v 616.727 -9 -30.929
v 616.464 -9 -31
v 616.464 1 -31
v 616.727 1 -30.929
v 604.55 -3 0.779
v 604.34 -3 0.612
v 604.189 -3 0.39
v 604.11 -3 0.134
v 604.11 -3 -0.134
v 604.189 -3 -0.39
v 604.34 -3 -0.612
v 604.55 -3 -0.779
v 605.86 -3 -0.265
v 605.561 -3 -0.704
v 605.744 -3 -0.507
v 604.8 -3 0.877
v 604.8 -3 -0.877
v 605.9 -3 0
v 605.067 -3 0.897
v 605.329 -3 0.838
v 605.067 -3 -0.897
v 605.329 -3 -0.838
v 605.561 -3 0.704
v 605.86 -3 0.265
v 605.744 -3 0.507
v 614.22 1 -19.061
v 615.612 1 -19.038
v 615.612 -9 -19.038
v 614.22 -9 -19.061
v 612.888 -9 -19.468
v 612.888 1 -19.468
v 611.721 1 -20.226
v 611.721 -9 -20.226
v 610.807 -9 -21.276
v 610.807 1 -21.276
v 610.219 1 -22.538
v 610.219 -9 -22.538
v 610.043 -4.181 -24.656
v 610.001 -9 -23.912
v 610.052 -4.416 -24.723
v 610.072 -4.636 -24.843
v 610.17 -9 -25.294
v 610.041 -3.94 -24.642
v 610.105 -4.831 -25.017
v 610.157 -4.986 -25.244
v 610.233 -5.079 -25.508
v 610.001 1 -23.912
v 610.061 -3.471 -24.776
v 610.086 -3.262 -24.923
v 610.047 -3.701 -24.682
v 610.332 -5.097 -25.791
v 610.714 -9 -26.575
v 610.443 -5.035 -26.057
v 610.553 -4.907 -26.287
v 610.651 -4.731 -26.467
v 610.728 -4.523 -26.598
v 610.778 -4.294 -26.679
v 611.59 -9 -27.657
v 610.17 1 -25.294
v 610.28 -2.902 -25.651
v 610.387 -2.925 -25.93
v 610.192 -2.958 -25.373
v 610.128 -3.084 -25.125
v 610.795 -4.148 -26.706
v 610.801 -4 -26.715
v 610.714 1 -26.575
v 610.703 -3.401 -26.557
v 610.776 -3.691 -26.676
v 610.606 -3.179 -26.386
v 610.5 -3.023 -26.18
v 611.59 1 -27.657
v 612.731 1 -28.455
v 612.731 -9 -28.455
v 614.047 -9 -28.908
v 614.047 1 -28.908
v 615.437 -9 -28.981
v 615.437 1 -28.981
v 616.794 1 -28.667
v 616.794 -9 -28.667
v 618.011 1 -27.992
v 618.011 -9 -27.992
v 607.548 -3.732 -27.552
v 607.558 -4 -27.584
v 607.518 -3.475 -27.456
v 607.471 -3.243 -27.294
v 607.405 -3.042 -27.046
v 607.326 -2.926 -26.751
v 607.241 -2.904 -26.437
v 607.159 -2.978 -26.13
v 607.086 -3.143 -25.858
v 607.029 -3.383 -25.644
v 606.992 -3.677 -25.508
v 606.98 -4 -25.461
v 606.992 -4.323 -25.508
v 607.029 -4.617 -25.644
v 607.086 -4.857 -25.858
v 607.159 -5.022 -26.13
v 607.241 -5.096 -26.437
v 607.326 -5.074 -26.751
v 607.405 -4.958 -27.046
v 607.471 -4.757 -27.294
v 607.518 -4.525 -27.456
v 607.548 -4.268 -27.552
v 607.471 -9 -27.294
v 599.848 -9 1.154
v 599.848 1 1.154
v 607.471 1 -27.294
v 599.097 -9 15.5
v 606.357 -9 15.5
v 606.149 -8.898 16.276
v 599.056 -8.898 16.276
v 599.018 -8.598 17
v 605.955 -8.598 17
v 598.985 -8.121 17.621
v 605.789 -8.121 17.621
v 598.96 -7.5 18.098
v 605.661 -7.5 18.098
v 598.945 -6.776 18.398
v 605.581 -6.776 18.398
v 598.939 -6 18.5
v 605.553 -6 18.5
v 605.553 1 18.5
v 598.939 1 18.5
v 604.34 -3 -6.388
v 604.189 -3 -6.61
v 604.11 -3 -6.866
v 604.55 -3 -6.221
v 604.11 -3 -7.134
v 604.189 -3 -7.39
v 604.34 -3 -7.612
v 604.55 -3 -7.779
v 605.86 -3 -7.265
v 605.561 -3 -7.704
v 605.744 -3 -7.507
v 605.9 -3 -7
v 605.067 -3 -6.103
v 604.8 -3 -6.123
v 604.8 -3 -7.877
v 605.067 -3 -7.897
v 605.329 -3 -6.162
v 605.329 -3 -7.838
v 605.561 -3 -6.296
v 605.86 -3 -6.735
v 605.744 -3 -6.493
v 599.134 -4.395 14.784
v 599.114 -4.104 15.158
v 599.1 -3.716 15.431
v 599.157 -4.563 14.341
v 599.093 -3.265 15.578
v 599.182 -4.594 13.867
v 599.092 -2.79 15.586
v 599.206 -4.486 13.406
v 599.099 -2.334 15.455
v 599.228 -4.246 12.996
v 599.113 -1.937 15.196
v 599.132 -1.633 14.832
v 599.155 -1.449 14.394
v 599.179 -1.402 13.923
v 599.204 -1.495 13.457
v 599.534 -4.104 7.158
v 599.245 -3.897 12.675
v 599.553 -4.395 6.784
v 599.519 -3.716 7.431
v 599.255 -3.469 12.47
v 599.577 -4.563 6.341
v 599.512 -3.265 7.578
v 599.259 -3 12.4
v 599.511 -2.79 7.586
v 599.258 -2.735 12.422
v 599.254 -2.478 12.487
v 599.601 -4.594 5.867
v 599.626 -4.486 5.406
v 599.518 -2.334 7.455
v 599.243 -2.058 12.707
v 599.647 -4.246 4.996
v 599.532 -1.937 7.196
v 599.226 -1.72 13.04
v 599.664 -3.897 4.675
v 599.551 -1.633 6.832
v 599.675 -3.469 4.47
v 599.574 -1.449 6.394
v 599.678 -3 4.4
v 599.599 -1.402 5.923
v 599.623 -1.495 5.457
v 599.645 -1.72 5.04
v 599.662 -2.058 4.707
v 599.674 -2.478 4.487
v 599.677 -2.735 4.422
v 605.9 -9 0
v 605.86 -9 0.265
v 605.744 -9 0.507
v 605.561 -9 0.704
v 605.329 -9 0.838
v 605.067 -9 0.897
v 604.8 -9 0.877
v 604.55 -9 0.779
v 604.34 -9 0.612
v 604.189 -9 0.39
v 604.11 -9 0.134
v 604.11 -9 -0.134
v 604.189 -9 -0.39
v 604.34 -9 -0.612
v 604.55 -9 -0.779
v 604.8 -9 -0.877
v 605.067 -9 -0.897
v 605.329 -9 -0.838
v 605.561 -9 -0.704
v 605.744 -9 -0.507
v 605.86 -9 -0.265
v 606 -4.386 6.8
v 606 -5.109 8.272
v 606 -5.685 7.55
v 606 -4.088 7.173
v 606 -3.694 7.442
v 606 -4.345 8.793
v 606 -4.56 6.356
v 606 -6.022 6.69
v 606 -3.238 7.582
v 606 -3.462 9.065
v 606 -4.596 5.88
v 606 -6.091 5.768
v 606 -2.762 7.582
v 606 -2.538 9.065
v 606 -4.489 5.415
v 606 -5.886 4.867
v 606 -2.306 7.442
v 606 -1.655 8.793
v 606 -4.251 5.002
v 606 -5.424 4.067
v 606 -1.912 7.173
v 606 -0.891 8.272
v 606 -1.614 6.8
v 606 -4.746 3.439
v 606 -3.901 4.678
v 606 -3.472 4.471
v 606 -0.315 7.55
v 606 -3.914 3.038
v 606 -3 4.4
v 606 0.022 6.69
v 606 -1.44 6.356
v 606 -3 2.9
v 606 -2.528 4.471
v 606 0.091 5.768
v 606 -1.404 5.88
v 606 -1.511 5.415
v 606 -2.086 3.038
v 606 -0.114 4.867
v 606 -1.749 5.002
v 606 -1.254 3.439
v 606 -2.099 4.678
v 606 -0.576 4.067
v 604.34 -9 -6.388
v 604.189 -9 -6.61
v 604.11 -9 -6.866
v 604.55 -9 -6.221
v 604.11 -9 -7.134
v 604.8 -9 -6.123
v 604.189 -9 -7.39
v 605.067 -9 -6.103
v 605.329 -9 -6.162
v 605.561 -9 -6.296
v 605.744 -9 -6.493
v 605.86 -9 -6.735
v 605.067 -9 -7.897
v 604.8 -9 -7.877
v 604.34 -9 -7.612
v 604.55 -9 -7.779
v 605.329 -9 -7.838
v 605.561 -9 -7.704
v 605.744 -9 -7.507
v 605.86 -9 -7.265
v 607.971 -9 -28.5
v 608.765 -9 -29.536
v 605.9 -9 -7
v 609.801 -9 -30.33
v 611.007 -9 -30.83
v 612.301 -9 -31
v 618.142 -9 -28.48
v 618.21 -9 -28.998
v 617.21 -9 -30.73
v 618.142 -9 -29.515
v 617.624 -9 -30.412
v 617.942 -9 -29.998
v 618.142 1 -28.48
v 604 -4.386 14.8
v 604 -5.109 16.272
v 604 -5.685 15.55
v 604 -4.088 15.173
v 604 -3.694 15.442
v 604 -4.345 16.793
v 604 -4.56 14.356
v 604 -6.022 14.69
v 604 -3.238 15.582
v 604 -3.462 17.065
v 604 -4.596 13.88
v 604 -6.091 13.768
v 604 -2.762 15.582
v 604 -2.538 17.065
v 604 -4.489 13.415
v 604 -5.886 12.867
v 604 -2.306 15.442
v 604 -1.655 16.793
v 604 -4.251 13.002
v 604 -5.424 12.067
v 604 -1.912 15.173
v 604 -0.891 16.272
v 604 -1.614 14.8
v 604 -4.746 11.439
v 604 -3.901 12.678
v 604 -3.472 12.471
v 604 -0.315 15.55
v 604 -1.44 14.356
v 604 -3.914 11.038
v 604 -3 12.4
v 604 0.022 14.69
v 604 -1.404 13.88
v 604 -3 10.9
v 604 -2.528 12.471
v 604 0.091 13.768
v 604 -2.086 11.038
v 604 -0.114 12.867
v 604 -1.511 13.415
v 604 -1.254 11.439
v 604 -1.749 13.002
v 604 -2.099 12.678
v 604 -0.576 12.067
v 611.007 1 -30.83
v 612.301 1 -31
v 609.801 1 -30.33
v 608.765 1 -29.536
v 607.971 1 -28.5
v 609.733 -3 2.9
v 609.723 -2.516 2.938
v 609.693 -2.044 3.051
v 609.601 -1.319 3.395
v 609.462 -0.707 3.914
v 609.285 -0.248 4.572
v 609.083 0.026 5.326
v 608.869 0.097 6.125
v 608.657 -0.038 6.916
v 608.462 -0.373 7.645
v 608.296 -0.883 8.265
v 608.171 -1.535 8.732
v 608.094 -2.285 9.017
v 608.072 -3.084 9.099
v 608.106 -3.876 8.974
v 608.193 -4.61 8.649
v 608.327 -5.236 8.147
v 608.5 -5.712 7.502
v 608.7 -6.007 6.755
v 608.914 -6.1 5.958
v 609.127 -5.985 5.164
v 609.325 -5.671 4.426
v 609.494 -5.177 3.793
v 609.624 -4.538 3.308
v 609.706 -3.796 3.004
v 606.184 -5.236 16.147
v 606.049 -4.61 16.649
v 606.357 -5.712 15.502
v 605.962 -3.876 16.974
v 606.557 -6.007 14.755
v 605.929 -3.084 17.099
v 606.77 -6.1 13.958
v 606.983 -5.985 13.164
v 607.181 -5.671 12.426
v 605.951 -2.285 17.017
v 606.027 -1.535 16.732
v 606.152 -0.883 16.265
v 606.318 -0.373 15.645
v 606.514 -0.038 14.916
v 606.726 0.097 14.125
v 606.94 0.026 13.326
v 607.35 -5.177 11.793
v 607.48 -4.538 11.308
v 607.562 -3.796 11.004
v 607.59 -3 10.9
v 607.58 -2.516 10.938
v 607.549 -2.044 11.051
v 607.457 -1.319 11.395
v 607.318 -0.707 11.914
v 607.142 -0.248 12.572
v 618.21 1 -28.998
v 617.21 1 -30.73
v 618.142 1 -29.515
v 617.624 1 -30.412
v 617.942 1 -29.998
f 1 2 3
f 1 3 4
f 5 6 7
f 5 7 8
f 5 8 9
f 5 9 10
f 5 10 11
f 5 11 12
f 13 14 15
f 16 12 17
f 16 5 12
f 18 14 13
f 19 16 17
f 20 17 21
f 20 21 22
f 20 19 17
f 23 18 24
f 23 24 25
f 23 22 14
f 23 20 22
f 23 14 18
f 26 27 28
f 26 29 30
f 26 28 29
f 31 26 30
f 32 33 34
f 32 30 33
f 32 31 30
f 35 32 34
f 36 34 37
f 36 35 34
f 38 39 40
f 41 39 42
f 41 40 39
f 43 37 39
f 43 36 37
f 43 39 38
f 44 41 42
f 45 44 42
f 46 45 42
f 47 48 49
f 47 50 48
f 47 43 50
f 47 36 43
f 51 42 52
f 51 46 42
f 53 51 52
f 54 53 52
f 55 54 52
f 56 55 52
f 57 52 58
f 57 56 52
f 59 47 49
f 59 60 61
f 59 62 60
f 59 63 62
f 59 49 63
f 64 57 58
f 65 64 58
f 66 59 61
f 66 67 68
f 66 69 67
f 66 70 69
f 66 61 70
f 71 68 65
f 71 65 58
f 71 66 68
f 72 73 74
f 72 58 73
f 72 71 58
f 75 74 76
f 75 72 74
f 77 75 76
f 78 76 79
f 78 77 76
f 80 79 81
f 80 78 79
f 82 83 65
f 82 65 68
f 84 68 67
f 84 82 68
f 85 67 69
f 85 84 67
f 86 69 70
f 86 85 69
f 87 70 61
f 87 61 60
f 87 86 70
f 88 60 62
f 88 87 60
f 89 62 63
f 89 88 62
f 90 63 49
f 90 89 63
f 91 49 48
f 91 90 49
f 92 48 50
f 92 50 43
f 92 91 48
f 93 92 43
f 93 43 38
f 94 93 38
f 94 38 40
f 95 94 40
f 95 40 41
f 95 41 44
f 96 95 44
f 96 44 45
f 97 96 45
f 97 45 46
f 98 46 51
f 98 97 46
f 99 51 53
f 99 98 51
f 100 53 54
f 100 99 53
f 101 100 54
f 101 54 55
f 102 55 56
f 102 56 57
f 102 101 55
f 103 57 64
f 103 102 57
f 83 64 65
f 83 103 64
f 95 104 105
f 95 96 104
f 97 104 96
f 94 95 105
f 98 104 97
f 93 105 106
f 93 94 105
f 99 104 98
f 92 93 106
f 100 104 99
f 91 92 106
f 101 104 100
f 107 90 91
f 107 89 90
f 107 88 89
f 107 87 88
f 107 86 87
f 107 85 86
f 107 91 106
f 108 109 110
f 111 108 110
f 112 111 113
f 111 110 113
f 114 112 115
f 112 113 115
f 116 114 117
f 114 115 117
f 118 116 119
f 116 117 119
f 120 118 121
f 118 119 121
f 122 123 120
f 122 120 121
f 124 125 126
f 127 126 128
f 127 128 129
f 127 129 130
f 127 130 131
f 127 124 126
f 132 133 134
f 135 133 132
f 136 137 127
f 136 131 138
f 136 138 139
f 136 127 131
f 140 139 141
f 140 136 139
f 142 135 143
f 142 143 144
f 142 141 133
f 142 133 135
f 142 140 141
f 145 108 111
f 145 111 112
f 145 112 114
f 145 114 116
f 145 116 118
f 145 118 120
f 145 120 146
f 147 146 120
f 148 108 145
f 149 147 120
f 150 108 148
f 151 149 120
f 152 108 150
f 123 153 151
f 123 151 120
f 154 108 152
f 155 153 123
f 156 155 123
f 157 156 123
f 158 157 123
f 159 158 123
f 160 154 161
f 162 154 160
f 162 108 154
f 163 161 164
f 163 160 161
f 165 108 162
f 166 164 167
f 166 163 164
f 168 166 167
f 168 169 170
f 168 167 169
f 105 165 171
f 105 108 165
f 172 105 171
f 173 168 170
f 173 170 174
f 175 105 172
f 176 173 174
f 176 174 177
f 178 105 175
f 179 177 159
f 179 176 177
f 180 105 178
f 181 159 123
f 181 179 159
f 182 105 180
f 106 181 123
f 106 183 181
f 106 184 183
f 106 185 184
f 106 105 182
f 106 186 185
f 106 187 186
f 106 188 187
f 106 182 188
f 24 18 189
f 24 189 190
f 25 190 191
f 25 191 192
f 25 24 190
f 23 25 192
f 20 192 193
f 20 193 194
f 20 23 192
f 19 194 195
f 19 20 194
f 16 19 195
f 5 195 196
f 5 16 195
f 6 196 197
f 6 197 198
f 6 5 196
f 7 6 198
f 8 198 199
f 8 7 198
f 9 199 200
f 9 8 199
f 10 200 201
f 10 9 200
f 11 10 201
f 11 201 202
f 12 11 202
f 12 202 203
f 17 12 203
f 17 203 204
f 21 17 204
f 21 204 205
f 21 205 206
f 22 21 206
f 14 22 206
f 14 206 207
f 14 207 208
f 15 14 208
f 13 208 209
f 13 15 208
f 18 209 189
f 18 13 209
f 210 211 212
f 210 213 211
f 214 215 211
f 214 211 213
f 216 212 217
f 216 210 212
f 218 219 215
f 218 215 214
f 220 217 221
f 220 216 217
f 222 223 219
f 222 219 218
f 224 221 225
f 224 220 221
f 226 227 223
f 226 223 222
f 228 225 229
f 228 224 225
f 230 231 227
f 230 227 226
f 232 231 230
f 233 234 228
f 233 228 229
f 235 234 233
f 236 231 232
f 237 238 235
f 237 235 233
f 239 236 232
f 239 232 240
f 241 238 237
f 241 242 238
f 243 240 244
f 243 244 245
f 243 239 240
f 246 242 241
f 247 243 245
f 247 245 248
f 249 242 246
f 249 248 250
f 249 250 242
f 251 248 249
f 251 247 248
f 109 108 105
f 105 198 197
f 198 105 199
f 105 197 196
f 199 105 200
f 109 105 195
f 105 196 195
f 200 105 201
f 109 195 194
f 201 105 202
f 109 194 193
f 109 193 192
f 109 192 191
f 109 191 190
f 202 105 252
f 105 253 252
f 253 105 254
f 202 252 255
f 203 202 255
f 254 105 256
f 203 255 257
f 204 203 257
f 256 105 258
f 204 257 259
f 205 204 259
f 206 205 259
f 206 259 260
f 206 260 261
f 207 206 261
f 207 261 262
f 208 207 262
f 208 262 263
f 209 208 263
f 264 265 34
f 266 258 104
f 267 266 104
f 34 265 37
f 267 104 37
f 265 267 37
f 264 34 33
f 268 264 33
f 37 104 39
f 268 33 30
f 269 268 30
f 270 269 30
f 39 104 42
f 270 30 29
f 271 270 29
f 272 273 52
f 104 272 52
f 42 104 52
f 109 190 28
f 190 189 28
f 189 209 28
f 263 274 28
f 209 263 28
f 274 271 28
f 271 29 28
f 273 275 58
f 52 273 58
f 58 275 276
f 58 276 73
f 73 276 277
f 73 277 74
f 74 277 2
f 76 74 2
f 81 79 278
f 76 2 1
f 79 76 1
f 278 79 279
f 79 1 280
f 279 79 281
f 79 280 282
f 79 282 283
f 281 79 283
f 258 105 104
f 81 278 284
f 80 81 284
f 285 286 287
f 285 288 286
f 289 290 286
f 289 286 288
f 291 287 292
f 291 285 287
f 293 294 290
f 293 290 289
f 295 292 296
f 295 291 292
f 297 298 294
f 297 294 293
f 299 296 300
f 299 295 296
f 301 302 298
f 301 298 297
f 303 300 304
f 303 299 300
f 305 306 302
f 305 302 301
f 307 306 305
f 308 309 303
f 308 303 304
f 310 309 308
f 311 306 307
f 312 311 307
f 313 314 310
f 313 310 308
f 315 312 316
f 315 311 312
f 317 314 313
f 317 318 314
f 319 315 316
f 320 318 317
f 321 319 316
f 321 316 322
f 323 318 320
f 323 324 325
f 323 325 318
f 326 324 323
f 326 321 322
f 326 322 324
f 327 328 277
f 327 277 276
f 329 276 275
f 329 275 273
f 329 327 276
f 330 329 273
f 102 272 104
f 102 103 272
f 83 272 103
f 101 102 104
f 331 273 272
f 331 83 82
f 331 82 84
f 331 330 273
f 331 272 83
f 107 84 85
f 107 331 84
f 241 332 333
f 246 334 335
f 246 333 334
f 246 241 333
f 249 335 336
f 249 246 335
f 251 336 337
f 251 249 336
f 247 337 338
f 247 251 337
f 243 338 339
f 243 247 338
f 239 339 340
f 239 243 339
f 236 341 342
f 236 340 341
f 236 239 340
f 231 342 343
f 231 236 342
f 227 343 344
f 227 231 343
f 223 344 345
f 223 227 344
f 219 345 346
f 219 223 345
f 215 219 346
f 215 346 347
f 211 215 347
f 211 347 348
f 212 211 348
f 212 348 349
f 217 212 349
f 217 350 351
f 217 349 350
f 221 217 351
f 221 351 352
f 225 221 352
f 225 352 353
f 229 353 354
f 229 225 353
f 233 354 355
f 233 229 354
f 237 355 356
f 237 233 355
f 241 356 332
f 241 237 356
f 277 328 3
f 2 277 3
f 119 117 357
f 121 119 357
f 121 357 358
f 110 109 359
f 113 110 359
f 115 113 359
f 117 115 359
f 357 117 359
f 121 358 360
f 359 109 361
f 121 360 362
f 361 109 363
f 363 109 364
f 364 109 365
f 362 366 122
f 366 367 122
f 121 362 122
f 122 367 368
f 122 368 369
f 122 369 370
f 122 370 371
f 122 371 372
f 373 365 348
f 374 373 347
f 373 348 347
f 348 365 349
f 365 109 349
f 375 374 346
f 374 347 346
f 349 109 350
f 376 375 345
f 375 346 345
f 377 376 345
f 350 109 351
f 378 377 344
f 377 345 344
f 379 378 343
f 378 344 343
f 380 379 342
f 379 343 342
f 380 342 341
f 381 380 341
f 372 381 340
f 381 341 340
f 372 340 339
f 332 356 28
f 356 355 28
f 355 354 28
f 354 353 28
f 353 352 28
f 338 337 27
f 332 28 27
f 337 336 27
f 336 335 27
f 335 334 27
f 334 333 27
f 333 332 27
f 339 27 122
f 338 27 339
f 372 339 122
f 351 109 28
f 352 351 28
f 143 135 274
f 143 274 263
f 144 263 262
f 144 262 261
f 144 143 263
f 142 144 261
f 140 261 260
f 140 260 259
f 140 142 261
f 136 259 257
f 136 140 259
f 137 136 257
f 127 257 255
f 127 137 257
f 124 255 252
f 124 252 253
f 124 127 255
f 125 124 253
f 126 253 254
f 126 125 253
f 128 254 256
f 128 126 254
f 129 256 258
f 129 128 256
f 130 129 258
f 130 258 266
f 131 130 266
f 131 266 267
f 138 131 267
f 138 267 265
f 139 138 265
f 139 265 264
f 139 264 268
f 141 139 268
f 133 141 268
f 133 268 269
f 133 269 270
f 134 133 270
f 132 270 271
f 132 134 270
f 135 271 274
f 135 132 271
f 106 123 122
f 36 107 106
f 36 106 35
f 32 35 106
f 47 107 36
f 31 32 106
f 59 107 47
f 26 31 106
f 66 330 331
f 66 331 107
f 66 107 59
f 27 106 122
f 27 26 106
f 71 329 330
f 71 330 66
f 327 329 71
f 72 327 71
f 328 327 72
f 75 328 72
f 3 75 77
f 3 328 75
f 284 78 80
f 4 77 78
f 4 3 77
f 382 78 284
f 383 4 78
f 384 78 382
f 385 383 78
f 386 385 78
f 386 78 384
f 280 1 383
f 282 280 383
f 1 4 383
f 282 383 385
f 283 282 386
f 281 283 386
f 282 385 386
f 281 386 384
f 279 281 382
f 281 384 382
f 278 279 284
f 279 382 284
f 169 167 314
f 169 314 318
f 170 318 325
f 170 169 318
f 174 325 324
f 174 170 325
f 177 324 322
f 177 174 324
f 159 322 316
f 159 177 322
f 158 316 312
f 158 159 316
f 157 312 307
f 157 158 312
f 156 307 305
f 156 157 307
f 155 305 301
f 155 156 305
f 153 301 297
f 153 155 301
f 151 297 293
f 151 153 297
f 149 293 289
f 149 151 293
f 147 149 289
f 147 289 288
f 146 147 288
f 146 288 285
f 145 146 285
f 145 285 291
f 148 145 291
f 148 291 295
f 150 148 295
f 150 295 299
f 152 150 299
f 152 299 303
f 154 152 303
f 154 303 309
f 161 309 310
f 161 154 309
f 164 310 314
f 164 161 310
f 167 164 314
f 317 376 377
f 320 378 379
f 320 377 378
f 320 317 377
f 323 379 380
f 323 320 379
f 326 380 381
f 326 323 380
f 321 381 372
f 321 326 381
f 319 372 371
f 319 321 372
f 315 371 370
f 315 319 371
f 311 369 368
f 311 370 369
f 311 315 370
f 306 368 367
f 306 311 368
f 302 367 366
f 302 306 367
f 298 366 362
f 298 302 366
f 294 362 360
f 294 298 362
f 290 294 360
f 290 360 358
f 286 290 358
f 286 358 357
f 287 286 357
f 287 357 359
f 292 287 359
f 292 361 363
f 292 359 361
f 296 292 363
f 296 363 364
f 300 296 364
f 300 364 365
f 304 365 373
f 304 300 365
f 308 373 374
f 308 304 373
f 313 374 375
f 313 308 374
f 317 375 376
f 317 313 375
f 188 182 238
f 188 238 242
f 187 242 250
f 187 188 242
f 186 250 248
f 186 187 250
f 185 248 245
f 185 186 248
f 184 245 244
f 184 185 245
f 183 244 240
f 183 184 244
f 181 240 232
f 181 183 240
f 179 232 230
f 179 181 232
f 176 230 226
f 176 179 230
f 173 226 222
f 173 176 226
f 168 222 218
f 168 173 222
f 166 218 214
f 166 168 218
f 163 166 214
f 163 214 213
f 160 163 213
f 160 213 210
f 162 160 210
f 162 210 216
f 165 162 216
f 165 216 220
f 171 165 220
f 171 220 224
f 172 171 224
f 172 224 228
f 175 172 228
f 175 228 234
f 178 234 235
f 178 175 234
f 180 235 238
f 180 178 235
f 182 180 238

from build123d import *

# Parameters (mm, degrees)
CYLINDER167_R               = 0.9
CYLINDER167_DEPTH           = 6
CYLINDER168_R               = 0.9
CYLINDER168_DEPTH           = 6
CYLINDER166_R               = 1.1
CYLINDER166_DEPTH           = 10
CYLINDER166_PLACEMENT_ANGLE = 75
CYLINDER165_R               = 3.1
CYLINDER165_DEPTH           = 4
CYLINDER163_R               = 1.6
CYLINDER163_DEPTH           = 10
CYLINDER164_R               = 3.1
CYLINDER164_DEPTH           = 4
CYLINDER162_R               = 1.6
CYLINDER162_DEPTH           = 10
CYLINDER160_R               = 5
CYLINDER160_DEPTH           = 180
BOX077_W                    = 20
BOX077_H                    = 10
BOX077_DEPTH                = 10
BOX076_W                    = 21
BOX076_H                    = 10
BOX076_DEPTH                = 10
FILLET039_R                 = 3
BOX074_W                    = 21
BOX074_H                    = 10
BOX074_DEPTH                = 10
BOX073_W                    = 10
BOX073_H                    = 10
BOX073_DEPTH                = 25
BOX073_PLACEMENT_ANGLE      = 3
BOX075_W                    = 10
BOX075_H                    = 10
BOX075_DEPTH                = 54
BOX075_PLACEMENT_ANGLE      = 15
FILLET040_R                 = 2
FILLET041_R                 = 5


with BuildPart() as cylinder167:
    # Cylinder167 → Cylinder167 (new body)
    with BuildSketch(Plane(origin=(605, 11, -7), x_dir=(1, 0, 0), z_dir=(0, -1, 0))):
        Circle(CYLINDER167_R)
    extrude(amount=CYLINDER167_DEPTH)


with BuildPart() as fusion145:
    # Cylinder168 → Cylinder168 (new body)
    with BuildSketch(Plane(origin=(605, 11, 0), x_dir=(1, 0, 0), z_dir=(0, -1, 0))):
        Circle(CYLINDER168_R)
    extrude(amount=CYLINDER168_DEPTH)

    # Fusion145: union Cylinder167
    add(cylinder167.part)


with BuildPart() as fusion145_1:
    # Fusion145 placement: moved
    add(fusion145.part.moved(Location((0, -4, 0))))


with BuildPart() as cylinder166:
    # Cylinder166 → Cylinder166 (new body)
    with BuildSketch(Plane.XY):
        Circle(CYLINDER166_R)
    extrude(amount=CYLINDER166_DEPTH)


with BuildPart() as cylinder166_1:
    # Cylinder166 placement: moved
    add(cylinder166.part.moved(Location((604.475462, 6, -27.270932))).rotate(Axis((604.475462, 6, -27.270932), (0, 1, 0)), CYLINDER166_PLACEMENT_ANGLE))


with BuildPart() as cylinder165:
    # Cylinder165 → Cylinder165 (new body)
    with BuildSketch(Plane(origin=(606, 7, 6), x_dir=(0, 0, -1), z_dir=(1, 0, 0))):
        Circle(CYLINDER165_R)
    extrude(amount=CYLINDER165_DEPTH)


with BuildPart() as cylinder163:
    # Cylinder163 → Cylinder163 (new body)
    with BuildSketch(Plane(origin=(599, 7, 6), x_dir=(0, 0, -1), z_dir=(1, 0, 0))):
        Circle(CYLINDER163_R)
    extrude(amount=CYLINDER163_DEPTH)


with BuildPart() as cylinder164:
    # Cylinder164 → Cylinder164 (new body)
    with BuildSketch(Plane(origin=(604, 7, 14), x_dir=(0, 0, -1), z_dir=(1, 0, 0))):
        Circle(CYLINDER164_R)
    extrude(amount=CYLINDER164_DEPTH)


with BuildPart() as fusion144:
    # Cylinder162 → Cylinder162 (new body)
    with BuildSketch(Plane(origin=(599, 7, 14), x_dir=(0, 0, -1), z_dir=(1, 0, 0))):
        Circle(CYLINDER162_R)
    extrude(amount=CYLINDER162_DEPTH)

    # Fusion144: union Cylinder165, Cylinder163, Cylinder164
    add(cylinder165.part)
    add(cylinder163.part)
    add(cylinder164.part)


with BuildPart() as cylinder160:
    # Cylinder160 → Cylinder160 (new body)
    with BuildSketch(Plane(origin=(615, 121, -24), x_dir=(1, 0, 0), z_dir=(0, -1, 0))):
        Circle(CYLINDER160_R)
    extrude(amount=CYLINDER160_DEPTH)


with BuildPart() as box077:
    # Box077 → Box077 (new body)
    with BuildSketch(Plane(origin=(603, 1, -41), x_dir=(1, 0, 0), z_dir=(0, 0, 1))):
        with Locations((10, 5)):
            Rectangle(BOX077_W, BOX077_H)
    extrude(amount=BOX077_DEPTH)


with BuildPart() as fillet039:
    # Box076 → Box076 (new body)
    with BuildSketch(Plane(origin=(591, 1, 8.5), x_dir=(1, 0, 0), z_dir=(0, 0, 1))):
        with Locations((10.5, 5)):
            Rectangle(BOX076_W, BOX076_H)
    extrude(amount=BOX076_DEPTH)

    # Fillet039
    fillet039_edges = [fillet039.edges().sort_by_distance(p)[0] for p in [
        (601.5, 1, 18.5),
    ]]
    fillet(fillet039_edges, radius=FILLET039_R)


with BuildPart() as cut088:
    # Box074 → Box074 (new body)
    with BuildSketch(Plane(origin=(591, 1, 15.5), x_dir=(1, 0, 0), z_dir=(0, 0, 1))):
        with Locations((10.5, 5)):
            Rectangle(BOX074_W, BOX074_H)
    extrude(amount=BOX074_DEPTH)

    # Cut088: cut Fillet039
    add(fillet039.part, mode=Mode.SUBTRACT)


with BuildPart() as fusion143:
    # Box073 → Box073 (new body)
    with BuildSketch(Plane.XY):
        with Locations((5, 5)):
            Rectangle(BOX073_W, BOX073_H)
    extrude(amount=BOX073_DEPTH)


with BuildPart() as fusion143_1:
    # Box073 placement: moved
    add(fusion143.part.moved(Location((590, 1, -2))).rotate(Axis((590, 1, -2), (0, -1, 0)), BOX073_PLACEMENT_ANGLE))

    # Fusion143: union Cut088
    add(cut088.part)


with BuildPart() as left_bumper_holder:
    # Box075 → Box075 (new body)
    with BuildSketch(Plane.XY):
        with Locations((5, 5)):
            Rectangle(BOX075_W, BOX075_H)
    extrude(amount=BOX075_DEPTH)


with BuildPart() as left_bumper_holder_1:
    # Box075 placement: moved
    add(left_bumper_holder.part.moved(Location((609, 1, -33))).rotate(Axis((609, 1, -33), (0, -1, 0)), BOX075_PLACEMENT_ANGLE))

    # Cut089: cut Fusion143
    add(fusion143_1.part, mode=Mode.SUBTRACT)

    # Cut090: cut Box077
    add(box077.part, mode=Mode.SUBTRACT)

    # Fillet040
    fillet040_edges = [left_bumper_holder_1.edges().sort_by_distance(p)[0] for p in [
        (618.659258, 6, -30.41181),
    ]]
    fillet(fillet040_edges, radius=FILLET040_R)

    # Fillet041
    fillet041_edges = [left_bumper_holder_1.edges().sort_by_distance(p)[0] for p in [
        (608.464102, 6, -31),
    ]]
    fillet(fillet041_edges, radius=FILLET041_R)

    # Cut091: cut Cylinder160
    add(cylinder160.part, mode=Mode.SUBTRACT)

    # Cut092: cut Fusion144
    add(fusion144.part, mode=Mode.SUBTRACT)

    # Cut093: cut Cylinder166
    add(cylinder166_1.part, mode=Mode.SUBTRACT)

    # Cut094: cut Fusion145
    add(fusion145_1.part, mode=Mode.SUBTRACT)


with BuildPart() as left_bumper_holder_2:
    # Cut094 placement: moved
    add(left_bumper_holder_1.part.moved(Location((0, -10, 0))))


solid = left_bumper_holder_2.part
